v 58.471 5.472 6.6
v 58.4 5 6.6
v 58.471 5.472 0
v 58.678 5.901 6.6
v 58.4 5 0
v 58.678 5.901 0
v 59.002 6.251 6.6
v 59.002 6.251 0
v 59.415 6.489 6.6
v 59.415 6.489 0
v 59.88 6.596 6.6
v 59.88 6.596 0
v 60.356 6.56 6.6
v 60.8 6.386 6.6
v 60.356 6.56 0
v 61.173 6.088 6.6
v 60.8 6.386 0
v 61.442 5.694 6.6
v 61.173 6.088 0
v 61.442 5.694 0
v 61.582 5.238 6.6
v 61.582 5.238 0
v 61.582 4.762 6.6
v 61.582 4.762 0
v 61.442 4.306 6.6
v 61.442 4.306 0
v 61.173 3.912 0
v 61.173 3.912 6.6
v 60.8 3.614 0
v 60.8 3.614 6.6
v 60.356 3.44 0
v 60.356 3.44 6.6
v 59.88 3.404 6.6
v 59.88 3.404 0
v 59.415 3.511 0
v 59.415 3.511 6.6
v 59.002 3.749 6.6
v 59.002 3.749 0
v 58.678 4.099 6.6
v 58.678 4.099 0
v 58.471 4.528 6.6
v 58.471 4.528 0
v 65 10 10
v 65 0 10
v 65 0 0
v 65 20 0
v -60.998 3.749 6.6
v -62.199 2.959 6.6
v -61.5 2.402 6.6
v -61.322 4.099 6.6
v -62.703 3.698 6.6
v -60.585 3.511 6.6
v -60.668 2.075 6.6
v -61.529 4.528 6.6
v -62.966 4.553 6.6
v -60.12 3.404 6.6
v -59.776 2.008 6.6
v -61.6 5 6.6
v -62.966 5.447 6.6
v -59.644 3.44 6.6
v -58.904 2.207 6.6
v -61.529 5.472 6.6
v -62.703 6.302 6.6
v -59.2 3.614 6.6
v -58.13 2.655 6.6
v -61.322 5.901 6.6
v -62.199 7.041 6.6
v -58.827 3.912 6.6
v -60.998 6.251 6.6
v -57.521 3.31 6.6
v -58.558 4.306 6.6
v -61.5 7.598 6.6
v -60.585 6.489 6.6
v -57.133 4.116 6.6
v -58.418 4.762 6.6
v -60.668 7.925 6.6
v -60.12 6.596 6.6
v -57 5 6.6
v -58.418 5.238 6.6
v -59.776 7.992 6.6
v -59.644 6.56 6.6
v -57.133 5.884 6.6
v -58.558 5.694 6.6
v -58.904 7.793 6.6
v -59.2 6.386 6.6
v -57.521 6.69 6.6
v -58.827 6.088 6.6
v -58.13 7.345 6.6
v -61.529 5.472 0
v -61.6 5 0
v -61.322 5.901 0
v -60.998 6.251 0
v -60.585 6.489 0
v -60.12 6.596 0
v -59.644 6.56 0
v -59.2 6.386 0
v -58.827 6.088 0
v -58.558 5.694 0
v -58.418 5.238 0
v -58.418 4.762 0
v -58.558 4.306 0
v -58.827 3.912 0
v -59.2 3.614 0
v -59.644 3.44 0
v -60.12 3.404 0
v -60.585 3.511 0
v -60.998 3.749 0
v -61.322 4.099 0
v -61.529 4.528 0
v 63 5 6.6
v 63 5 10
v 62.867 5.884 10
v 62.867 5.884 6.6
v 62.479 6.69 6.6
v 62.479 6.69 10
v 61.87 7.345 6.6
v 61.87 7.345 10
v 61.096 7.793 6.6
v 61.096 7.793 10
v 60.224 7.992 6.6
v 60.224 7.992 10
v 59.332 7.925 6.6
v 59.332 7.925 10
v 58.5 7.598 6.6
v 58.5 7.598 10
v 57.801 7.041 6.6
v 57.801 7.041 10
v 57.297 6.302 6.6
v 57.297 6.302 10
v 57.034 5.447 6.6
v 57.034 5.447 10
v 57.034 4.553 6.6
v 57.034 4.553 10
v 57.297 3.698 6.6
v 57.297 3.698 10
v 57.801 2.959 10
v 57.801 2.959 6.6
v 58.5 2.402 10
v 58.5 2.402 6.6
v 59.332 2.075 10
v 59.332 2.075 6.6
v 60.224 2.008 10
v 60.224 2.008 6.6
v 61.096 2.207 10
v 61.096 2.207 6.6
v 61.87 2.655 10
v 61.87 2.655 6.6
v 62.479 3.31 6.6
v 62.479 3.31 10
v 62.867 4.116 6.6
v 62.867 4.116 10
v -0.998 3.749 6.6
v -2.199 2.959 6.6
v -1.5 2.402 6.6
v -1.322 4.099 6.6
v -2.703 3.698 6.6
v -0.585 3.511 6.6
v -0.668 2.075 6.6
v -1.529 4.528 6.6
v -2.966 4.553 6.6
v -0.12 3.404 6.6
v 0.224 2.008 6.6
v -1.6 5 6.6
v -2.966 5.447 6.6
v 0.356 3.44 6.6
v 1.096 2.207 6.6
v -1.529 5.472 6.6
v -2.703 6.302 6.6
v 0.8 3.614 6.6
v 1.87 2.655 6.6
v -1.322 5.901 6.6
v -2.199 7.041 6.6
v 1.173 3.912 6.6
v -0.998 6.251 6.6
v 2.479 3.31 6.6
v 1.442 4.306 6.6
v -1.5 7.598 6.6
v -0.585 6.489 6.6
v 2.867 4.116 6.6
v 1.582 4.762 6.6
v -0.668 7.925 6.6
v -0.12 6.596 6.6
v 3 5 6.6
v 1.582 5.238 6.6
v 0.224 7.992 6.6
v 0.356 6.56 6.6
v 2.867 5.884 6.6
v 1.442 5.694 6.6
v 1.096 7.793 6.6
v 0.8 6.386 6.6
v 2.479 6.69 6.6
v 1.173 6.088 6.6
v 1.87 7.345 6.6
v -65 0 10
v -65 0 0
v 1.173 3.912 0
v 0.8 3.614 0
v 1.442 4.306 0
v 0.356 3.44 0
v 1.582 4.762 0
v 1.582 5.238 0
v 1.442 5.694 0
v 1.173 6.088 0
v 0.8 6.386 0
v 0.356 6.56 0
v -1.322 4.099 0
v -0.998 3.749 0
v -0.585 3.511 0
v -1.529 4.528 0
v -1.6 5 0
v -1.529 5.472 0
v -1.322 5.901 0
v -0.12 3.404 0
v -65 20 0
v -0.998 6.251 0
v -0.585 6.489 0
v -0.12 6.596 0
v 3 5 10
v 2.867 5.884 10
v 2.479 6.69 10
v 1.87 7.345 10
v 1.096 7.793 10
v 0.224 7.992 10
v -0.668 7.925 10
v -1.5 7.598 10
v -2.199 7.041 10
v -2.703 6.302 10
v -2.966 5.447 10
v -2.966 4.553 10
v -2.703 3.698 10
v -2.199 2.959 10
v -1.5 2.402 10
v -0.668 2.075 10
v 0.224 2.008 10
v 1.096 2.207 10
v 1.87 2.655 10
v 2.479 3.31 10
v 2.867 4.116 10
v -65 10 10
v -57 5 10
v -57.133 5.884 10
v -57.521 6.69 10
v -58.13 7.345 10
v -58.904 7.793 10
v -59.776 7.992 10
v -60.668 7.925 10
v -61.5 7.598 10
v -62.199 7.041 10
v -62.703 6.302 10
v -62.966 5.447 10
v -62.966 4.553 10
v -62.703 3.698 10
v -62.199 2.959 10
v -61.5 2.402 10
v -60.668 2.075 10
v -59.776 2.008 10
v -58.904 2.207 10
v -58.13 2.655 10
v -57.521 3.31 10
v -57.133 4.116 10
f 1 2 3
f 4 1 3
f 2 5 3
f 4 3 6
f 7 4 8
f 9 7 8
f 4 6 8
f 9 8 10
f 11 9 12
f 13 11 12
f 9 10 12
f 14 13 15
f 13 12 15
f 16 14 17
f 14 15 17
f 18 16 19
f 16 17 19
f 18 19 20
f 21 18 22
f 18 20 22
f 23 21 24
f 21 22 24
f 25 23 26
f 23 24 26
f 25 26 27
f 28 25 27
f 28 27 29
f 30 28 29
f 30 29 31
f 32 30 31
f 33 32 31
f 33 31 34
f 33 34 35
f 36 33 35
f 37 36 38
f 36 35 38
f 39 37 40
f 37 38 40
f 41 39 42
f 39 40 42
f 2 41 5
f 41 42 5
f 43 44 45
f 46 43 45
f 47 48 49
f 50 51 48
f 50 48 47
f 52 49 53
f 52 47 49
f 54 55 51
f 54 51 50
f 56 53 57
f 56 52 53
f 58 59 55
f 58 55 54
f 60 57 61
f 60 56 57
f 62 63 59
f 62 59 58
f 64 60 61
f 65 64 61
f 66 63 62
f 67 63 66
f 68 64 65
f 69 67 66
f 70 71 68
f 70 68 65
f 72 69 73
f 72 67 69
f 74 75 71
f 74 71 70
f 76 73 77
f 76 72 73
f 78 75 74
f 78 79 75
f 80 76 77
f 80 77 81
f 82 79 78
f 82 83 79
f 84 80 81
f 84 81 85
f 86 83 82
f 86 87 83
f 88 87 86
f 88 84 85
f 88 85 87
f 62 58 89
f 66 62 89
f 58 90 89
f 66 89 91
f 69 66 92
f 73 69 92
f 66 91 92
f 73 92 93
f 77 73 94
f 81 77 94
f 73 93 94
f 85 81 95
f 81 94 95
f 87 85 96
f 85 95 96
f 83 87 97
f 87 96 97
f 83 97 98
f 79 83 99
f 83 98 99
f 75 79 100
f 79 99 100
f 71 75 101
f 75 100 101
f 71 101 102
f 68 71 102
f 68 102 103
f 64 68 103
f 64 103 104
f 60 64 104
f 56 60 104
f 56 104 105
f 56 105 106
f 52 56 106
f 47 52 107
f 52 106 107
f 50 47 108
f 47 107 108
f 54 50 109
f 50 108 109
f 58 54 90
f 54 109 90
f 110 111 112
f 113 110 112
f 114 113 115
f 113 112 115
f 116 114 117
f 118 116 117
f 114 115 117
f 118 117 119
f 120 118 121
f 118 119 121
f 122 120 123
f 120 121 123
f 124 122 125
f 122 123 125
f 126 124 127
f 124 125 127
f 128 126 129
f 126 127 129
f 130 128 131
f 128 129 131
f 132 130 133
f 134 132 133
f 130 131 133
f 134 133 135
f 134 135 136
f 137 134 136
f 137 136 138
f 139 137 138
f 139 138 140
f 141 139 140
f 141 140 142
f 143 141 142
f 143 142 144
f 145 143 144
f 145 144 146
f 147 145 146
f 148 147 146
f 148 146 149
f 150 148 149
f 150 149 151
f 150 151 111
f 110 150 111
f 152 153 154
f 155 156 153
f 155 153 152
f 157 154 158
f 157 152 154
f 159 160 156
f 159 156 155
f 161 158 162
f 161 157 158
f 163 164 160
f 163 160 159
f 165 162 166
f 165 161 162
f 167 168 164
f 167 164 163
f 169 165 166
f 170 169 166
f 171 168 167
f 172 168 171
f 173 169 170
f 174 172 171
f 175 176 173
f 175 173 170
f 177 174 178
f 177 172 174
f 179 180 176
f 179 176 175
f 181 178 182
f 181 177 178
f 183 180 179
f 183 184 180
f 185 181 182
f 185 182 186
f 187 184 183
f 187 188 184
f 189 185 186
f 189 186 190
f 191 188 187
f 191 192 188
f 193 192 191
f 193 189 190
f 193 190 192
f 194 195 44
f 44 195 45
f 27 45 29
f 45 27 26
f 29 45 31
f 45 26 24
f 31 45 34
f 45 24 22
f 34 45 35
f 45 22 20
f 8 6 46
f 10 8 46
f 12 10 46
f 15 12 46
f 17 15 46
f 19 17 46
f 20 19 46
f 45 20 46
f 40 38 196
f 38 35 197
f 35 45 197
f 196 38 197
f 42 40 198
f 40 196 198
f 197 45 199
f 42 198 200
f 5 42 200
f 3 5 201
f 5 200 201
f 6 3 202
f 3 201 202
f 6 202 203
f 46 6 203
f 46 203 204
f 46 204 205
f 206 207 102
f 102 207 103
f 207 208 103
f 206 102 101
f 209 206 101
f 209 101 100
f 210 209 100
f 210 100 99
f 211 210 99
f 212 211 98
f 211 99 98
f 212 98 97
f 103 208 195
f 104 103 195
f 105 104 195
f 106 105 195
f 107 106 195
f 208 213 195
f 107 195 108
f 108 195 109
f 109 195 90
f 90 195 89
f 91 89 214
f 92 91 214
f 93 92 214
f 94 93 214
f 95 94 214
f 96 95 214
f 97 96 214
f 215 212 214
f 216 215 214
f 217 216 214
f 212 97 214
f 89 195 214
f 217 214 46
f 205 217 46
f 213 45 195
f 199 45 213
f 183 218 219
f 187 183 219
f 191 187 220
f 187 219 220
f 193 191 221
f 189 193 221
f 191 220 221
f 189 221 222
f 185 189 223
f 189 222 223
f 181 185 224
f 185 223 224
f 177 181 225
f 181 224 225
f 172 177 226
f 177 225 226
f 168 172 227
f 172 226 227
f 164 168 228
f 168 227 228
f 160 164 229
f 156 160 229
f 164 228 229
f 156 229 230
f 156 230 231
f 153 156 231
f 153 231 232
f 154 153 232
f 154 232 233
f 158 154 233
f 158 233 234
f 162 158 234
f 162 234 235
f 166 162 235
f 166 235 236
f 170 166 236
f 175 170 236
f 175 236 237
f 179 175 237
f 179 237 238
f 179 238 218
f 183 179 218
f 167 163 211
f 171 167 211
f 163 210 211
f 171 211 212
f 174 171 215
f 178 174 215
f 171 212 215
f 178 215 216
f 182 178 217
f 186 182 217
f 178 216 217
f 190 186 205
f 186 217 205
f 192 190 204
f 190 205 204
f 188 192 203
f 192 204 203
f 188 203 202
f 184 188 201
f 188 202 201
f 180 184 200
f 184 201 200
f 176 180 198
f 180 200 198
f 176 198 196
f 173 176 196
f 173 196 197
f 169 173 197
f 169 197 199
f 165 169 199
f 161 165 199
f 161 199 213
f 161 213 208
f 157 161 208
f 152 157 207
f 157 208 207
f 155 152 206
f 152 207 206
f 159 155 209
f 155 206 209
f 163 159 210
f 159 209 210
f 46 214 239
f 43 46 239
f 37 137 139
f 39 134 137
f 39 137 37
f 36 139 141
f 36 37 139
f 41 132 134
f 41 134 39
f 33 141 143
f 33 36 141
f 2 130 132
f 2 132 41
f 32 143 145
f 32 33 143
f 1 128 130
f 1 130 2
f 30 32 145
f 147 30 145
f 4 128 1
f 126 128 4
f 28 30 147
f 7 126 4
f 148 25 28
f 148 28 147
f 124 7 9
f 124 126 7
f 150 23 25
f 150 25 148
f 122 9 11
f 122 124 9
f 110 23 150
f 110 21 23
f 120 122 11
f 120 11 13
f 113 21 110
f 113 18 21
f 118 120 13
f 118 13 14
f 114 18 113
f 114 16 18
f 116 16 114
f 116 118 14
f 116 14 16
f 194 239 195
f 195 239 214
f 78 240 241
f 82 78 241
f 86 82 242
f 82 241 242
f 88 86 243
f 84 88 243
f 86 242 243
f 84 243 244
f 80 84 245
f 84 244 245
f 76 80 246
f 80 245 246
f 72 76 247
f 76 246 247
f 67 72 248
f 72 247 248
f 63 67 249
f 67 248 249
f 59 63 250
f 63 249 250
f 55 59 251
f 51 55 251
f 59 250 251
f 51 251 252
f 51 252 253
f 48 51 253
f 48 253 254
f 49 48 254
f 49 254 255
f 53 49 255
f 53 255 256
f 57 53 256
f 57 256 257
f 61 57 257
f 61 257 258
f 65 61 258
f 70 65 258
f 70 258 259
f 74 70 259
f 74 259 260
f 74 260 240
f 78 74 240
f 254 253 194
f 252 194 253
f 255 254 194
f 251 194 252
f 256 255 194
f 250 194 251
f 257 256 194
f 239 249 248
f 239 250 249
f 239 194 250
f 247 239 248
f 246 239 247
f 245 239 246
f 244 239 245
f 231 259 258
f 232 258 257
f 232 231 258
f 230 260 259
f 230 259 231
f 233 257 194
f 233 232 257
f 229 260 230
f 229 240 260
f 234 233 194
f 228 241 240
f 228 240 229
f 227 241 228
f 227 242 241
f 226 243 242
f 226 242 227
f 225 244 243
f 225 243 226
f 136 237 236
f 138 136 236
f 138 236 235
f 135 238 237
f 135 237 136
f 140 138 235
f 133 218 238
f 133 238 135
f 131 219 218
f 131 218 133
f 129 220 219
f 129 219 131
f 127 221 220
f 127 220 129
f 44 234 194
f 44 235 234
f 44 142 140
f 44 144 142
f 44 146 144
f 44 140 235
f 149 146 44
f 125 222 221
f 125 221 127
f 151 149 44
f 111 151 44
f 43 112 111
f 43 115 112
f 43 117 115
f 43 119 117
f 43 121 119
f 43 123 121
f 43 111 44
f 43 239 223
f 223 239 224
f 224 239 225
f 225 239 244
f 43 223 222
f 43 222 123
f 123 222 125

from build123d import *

# Parameters (mm, degrees)
SKETCH1_W                                            = 130
SKETCH1_H                                            = 10
BOSS_EXTRUDE1_DEPTH                                  = 10
CBORE_FOR_M3_HEXAGON_SOCKET_HEAD_CAP_SCR_D           = 3.2
CBORE_FOR_M3_HEXAGON_SOCKET_HEAD_CAP_SCR_CBORE_D     = 6
CBORE_FOR_M3_HEXAGON_SOCKET_HEAD_CAP_SCR_CBORE_DEPTH = 3.4
BOSS_EXTRUDE2_DEPTH                                  = 130


with BuildPart() as part:
    # Sketch1 → Boss-Extrude1 (new body)
    with BuildSketch(Plane.XY):
        with Locations((0, 5)):
            Rectangle(SKETCH1_W, SKETCH1_H)
    extrude(amount=BOSS_EXTRUDE1_DEPTH)

    # CBORE for M3 Hexagon socket head cap screws1 (through all)
    with Locations(Plane.XY.offset(10)):
        with Locations((-60, 5), (0, 5), (60, 5)):
            CounterBoreHole(CBORE_FOR_M3_HEXAGON_SOCKET_HEAD_CAP_SCR_D / 2, CBORE_FOR_M3_HEXAGON_SOCKET_HEAD_CAP_SCR_CBORE_D / 2, CBORE_FOR_M3_HEXAGON_SOCKET_HEAD_CAP_SCR_CBORE_DEPTH)

    # Sketch4 → Boss-Extrude2 (add)
    with BuildSketch(Plane.ZY.offset(65)):
        Polygon((10, 10), (0, 10), (0, 20), align=None)
    extrude(amount=-BOSS_EXTRUDE2_DEPTH)


solid = part.part
